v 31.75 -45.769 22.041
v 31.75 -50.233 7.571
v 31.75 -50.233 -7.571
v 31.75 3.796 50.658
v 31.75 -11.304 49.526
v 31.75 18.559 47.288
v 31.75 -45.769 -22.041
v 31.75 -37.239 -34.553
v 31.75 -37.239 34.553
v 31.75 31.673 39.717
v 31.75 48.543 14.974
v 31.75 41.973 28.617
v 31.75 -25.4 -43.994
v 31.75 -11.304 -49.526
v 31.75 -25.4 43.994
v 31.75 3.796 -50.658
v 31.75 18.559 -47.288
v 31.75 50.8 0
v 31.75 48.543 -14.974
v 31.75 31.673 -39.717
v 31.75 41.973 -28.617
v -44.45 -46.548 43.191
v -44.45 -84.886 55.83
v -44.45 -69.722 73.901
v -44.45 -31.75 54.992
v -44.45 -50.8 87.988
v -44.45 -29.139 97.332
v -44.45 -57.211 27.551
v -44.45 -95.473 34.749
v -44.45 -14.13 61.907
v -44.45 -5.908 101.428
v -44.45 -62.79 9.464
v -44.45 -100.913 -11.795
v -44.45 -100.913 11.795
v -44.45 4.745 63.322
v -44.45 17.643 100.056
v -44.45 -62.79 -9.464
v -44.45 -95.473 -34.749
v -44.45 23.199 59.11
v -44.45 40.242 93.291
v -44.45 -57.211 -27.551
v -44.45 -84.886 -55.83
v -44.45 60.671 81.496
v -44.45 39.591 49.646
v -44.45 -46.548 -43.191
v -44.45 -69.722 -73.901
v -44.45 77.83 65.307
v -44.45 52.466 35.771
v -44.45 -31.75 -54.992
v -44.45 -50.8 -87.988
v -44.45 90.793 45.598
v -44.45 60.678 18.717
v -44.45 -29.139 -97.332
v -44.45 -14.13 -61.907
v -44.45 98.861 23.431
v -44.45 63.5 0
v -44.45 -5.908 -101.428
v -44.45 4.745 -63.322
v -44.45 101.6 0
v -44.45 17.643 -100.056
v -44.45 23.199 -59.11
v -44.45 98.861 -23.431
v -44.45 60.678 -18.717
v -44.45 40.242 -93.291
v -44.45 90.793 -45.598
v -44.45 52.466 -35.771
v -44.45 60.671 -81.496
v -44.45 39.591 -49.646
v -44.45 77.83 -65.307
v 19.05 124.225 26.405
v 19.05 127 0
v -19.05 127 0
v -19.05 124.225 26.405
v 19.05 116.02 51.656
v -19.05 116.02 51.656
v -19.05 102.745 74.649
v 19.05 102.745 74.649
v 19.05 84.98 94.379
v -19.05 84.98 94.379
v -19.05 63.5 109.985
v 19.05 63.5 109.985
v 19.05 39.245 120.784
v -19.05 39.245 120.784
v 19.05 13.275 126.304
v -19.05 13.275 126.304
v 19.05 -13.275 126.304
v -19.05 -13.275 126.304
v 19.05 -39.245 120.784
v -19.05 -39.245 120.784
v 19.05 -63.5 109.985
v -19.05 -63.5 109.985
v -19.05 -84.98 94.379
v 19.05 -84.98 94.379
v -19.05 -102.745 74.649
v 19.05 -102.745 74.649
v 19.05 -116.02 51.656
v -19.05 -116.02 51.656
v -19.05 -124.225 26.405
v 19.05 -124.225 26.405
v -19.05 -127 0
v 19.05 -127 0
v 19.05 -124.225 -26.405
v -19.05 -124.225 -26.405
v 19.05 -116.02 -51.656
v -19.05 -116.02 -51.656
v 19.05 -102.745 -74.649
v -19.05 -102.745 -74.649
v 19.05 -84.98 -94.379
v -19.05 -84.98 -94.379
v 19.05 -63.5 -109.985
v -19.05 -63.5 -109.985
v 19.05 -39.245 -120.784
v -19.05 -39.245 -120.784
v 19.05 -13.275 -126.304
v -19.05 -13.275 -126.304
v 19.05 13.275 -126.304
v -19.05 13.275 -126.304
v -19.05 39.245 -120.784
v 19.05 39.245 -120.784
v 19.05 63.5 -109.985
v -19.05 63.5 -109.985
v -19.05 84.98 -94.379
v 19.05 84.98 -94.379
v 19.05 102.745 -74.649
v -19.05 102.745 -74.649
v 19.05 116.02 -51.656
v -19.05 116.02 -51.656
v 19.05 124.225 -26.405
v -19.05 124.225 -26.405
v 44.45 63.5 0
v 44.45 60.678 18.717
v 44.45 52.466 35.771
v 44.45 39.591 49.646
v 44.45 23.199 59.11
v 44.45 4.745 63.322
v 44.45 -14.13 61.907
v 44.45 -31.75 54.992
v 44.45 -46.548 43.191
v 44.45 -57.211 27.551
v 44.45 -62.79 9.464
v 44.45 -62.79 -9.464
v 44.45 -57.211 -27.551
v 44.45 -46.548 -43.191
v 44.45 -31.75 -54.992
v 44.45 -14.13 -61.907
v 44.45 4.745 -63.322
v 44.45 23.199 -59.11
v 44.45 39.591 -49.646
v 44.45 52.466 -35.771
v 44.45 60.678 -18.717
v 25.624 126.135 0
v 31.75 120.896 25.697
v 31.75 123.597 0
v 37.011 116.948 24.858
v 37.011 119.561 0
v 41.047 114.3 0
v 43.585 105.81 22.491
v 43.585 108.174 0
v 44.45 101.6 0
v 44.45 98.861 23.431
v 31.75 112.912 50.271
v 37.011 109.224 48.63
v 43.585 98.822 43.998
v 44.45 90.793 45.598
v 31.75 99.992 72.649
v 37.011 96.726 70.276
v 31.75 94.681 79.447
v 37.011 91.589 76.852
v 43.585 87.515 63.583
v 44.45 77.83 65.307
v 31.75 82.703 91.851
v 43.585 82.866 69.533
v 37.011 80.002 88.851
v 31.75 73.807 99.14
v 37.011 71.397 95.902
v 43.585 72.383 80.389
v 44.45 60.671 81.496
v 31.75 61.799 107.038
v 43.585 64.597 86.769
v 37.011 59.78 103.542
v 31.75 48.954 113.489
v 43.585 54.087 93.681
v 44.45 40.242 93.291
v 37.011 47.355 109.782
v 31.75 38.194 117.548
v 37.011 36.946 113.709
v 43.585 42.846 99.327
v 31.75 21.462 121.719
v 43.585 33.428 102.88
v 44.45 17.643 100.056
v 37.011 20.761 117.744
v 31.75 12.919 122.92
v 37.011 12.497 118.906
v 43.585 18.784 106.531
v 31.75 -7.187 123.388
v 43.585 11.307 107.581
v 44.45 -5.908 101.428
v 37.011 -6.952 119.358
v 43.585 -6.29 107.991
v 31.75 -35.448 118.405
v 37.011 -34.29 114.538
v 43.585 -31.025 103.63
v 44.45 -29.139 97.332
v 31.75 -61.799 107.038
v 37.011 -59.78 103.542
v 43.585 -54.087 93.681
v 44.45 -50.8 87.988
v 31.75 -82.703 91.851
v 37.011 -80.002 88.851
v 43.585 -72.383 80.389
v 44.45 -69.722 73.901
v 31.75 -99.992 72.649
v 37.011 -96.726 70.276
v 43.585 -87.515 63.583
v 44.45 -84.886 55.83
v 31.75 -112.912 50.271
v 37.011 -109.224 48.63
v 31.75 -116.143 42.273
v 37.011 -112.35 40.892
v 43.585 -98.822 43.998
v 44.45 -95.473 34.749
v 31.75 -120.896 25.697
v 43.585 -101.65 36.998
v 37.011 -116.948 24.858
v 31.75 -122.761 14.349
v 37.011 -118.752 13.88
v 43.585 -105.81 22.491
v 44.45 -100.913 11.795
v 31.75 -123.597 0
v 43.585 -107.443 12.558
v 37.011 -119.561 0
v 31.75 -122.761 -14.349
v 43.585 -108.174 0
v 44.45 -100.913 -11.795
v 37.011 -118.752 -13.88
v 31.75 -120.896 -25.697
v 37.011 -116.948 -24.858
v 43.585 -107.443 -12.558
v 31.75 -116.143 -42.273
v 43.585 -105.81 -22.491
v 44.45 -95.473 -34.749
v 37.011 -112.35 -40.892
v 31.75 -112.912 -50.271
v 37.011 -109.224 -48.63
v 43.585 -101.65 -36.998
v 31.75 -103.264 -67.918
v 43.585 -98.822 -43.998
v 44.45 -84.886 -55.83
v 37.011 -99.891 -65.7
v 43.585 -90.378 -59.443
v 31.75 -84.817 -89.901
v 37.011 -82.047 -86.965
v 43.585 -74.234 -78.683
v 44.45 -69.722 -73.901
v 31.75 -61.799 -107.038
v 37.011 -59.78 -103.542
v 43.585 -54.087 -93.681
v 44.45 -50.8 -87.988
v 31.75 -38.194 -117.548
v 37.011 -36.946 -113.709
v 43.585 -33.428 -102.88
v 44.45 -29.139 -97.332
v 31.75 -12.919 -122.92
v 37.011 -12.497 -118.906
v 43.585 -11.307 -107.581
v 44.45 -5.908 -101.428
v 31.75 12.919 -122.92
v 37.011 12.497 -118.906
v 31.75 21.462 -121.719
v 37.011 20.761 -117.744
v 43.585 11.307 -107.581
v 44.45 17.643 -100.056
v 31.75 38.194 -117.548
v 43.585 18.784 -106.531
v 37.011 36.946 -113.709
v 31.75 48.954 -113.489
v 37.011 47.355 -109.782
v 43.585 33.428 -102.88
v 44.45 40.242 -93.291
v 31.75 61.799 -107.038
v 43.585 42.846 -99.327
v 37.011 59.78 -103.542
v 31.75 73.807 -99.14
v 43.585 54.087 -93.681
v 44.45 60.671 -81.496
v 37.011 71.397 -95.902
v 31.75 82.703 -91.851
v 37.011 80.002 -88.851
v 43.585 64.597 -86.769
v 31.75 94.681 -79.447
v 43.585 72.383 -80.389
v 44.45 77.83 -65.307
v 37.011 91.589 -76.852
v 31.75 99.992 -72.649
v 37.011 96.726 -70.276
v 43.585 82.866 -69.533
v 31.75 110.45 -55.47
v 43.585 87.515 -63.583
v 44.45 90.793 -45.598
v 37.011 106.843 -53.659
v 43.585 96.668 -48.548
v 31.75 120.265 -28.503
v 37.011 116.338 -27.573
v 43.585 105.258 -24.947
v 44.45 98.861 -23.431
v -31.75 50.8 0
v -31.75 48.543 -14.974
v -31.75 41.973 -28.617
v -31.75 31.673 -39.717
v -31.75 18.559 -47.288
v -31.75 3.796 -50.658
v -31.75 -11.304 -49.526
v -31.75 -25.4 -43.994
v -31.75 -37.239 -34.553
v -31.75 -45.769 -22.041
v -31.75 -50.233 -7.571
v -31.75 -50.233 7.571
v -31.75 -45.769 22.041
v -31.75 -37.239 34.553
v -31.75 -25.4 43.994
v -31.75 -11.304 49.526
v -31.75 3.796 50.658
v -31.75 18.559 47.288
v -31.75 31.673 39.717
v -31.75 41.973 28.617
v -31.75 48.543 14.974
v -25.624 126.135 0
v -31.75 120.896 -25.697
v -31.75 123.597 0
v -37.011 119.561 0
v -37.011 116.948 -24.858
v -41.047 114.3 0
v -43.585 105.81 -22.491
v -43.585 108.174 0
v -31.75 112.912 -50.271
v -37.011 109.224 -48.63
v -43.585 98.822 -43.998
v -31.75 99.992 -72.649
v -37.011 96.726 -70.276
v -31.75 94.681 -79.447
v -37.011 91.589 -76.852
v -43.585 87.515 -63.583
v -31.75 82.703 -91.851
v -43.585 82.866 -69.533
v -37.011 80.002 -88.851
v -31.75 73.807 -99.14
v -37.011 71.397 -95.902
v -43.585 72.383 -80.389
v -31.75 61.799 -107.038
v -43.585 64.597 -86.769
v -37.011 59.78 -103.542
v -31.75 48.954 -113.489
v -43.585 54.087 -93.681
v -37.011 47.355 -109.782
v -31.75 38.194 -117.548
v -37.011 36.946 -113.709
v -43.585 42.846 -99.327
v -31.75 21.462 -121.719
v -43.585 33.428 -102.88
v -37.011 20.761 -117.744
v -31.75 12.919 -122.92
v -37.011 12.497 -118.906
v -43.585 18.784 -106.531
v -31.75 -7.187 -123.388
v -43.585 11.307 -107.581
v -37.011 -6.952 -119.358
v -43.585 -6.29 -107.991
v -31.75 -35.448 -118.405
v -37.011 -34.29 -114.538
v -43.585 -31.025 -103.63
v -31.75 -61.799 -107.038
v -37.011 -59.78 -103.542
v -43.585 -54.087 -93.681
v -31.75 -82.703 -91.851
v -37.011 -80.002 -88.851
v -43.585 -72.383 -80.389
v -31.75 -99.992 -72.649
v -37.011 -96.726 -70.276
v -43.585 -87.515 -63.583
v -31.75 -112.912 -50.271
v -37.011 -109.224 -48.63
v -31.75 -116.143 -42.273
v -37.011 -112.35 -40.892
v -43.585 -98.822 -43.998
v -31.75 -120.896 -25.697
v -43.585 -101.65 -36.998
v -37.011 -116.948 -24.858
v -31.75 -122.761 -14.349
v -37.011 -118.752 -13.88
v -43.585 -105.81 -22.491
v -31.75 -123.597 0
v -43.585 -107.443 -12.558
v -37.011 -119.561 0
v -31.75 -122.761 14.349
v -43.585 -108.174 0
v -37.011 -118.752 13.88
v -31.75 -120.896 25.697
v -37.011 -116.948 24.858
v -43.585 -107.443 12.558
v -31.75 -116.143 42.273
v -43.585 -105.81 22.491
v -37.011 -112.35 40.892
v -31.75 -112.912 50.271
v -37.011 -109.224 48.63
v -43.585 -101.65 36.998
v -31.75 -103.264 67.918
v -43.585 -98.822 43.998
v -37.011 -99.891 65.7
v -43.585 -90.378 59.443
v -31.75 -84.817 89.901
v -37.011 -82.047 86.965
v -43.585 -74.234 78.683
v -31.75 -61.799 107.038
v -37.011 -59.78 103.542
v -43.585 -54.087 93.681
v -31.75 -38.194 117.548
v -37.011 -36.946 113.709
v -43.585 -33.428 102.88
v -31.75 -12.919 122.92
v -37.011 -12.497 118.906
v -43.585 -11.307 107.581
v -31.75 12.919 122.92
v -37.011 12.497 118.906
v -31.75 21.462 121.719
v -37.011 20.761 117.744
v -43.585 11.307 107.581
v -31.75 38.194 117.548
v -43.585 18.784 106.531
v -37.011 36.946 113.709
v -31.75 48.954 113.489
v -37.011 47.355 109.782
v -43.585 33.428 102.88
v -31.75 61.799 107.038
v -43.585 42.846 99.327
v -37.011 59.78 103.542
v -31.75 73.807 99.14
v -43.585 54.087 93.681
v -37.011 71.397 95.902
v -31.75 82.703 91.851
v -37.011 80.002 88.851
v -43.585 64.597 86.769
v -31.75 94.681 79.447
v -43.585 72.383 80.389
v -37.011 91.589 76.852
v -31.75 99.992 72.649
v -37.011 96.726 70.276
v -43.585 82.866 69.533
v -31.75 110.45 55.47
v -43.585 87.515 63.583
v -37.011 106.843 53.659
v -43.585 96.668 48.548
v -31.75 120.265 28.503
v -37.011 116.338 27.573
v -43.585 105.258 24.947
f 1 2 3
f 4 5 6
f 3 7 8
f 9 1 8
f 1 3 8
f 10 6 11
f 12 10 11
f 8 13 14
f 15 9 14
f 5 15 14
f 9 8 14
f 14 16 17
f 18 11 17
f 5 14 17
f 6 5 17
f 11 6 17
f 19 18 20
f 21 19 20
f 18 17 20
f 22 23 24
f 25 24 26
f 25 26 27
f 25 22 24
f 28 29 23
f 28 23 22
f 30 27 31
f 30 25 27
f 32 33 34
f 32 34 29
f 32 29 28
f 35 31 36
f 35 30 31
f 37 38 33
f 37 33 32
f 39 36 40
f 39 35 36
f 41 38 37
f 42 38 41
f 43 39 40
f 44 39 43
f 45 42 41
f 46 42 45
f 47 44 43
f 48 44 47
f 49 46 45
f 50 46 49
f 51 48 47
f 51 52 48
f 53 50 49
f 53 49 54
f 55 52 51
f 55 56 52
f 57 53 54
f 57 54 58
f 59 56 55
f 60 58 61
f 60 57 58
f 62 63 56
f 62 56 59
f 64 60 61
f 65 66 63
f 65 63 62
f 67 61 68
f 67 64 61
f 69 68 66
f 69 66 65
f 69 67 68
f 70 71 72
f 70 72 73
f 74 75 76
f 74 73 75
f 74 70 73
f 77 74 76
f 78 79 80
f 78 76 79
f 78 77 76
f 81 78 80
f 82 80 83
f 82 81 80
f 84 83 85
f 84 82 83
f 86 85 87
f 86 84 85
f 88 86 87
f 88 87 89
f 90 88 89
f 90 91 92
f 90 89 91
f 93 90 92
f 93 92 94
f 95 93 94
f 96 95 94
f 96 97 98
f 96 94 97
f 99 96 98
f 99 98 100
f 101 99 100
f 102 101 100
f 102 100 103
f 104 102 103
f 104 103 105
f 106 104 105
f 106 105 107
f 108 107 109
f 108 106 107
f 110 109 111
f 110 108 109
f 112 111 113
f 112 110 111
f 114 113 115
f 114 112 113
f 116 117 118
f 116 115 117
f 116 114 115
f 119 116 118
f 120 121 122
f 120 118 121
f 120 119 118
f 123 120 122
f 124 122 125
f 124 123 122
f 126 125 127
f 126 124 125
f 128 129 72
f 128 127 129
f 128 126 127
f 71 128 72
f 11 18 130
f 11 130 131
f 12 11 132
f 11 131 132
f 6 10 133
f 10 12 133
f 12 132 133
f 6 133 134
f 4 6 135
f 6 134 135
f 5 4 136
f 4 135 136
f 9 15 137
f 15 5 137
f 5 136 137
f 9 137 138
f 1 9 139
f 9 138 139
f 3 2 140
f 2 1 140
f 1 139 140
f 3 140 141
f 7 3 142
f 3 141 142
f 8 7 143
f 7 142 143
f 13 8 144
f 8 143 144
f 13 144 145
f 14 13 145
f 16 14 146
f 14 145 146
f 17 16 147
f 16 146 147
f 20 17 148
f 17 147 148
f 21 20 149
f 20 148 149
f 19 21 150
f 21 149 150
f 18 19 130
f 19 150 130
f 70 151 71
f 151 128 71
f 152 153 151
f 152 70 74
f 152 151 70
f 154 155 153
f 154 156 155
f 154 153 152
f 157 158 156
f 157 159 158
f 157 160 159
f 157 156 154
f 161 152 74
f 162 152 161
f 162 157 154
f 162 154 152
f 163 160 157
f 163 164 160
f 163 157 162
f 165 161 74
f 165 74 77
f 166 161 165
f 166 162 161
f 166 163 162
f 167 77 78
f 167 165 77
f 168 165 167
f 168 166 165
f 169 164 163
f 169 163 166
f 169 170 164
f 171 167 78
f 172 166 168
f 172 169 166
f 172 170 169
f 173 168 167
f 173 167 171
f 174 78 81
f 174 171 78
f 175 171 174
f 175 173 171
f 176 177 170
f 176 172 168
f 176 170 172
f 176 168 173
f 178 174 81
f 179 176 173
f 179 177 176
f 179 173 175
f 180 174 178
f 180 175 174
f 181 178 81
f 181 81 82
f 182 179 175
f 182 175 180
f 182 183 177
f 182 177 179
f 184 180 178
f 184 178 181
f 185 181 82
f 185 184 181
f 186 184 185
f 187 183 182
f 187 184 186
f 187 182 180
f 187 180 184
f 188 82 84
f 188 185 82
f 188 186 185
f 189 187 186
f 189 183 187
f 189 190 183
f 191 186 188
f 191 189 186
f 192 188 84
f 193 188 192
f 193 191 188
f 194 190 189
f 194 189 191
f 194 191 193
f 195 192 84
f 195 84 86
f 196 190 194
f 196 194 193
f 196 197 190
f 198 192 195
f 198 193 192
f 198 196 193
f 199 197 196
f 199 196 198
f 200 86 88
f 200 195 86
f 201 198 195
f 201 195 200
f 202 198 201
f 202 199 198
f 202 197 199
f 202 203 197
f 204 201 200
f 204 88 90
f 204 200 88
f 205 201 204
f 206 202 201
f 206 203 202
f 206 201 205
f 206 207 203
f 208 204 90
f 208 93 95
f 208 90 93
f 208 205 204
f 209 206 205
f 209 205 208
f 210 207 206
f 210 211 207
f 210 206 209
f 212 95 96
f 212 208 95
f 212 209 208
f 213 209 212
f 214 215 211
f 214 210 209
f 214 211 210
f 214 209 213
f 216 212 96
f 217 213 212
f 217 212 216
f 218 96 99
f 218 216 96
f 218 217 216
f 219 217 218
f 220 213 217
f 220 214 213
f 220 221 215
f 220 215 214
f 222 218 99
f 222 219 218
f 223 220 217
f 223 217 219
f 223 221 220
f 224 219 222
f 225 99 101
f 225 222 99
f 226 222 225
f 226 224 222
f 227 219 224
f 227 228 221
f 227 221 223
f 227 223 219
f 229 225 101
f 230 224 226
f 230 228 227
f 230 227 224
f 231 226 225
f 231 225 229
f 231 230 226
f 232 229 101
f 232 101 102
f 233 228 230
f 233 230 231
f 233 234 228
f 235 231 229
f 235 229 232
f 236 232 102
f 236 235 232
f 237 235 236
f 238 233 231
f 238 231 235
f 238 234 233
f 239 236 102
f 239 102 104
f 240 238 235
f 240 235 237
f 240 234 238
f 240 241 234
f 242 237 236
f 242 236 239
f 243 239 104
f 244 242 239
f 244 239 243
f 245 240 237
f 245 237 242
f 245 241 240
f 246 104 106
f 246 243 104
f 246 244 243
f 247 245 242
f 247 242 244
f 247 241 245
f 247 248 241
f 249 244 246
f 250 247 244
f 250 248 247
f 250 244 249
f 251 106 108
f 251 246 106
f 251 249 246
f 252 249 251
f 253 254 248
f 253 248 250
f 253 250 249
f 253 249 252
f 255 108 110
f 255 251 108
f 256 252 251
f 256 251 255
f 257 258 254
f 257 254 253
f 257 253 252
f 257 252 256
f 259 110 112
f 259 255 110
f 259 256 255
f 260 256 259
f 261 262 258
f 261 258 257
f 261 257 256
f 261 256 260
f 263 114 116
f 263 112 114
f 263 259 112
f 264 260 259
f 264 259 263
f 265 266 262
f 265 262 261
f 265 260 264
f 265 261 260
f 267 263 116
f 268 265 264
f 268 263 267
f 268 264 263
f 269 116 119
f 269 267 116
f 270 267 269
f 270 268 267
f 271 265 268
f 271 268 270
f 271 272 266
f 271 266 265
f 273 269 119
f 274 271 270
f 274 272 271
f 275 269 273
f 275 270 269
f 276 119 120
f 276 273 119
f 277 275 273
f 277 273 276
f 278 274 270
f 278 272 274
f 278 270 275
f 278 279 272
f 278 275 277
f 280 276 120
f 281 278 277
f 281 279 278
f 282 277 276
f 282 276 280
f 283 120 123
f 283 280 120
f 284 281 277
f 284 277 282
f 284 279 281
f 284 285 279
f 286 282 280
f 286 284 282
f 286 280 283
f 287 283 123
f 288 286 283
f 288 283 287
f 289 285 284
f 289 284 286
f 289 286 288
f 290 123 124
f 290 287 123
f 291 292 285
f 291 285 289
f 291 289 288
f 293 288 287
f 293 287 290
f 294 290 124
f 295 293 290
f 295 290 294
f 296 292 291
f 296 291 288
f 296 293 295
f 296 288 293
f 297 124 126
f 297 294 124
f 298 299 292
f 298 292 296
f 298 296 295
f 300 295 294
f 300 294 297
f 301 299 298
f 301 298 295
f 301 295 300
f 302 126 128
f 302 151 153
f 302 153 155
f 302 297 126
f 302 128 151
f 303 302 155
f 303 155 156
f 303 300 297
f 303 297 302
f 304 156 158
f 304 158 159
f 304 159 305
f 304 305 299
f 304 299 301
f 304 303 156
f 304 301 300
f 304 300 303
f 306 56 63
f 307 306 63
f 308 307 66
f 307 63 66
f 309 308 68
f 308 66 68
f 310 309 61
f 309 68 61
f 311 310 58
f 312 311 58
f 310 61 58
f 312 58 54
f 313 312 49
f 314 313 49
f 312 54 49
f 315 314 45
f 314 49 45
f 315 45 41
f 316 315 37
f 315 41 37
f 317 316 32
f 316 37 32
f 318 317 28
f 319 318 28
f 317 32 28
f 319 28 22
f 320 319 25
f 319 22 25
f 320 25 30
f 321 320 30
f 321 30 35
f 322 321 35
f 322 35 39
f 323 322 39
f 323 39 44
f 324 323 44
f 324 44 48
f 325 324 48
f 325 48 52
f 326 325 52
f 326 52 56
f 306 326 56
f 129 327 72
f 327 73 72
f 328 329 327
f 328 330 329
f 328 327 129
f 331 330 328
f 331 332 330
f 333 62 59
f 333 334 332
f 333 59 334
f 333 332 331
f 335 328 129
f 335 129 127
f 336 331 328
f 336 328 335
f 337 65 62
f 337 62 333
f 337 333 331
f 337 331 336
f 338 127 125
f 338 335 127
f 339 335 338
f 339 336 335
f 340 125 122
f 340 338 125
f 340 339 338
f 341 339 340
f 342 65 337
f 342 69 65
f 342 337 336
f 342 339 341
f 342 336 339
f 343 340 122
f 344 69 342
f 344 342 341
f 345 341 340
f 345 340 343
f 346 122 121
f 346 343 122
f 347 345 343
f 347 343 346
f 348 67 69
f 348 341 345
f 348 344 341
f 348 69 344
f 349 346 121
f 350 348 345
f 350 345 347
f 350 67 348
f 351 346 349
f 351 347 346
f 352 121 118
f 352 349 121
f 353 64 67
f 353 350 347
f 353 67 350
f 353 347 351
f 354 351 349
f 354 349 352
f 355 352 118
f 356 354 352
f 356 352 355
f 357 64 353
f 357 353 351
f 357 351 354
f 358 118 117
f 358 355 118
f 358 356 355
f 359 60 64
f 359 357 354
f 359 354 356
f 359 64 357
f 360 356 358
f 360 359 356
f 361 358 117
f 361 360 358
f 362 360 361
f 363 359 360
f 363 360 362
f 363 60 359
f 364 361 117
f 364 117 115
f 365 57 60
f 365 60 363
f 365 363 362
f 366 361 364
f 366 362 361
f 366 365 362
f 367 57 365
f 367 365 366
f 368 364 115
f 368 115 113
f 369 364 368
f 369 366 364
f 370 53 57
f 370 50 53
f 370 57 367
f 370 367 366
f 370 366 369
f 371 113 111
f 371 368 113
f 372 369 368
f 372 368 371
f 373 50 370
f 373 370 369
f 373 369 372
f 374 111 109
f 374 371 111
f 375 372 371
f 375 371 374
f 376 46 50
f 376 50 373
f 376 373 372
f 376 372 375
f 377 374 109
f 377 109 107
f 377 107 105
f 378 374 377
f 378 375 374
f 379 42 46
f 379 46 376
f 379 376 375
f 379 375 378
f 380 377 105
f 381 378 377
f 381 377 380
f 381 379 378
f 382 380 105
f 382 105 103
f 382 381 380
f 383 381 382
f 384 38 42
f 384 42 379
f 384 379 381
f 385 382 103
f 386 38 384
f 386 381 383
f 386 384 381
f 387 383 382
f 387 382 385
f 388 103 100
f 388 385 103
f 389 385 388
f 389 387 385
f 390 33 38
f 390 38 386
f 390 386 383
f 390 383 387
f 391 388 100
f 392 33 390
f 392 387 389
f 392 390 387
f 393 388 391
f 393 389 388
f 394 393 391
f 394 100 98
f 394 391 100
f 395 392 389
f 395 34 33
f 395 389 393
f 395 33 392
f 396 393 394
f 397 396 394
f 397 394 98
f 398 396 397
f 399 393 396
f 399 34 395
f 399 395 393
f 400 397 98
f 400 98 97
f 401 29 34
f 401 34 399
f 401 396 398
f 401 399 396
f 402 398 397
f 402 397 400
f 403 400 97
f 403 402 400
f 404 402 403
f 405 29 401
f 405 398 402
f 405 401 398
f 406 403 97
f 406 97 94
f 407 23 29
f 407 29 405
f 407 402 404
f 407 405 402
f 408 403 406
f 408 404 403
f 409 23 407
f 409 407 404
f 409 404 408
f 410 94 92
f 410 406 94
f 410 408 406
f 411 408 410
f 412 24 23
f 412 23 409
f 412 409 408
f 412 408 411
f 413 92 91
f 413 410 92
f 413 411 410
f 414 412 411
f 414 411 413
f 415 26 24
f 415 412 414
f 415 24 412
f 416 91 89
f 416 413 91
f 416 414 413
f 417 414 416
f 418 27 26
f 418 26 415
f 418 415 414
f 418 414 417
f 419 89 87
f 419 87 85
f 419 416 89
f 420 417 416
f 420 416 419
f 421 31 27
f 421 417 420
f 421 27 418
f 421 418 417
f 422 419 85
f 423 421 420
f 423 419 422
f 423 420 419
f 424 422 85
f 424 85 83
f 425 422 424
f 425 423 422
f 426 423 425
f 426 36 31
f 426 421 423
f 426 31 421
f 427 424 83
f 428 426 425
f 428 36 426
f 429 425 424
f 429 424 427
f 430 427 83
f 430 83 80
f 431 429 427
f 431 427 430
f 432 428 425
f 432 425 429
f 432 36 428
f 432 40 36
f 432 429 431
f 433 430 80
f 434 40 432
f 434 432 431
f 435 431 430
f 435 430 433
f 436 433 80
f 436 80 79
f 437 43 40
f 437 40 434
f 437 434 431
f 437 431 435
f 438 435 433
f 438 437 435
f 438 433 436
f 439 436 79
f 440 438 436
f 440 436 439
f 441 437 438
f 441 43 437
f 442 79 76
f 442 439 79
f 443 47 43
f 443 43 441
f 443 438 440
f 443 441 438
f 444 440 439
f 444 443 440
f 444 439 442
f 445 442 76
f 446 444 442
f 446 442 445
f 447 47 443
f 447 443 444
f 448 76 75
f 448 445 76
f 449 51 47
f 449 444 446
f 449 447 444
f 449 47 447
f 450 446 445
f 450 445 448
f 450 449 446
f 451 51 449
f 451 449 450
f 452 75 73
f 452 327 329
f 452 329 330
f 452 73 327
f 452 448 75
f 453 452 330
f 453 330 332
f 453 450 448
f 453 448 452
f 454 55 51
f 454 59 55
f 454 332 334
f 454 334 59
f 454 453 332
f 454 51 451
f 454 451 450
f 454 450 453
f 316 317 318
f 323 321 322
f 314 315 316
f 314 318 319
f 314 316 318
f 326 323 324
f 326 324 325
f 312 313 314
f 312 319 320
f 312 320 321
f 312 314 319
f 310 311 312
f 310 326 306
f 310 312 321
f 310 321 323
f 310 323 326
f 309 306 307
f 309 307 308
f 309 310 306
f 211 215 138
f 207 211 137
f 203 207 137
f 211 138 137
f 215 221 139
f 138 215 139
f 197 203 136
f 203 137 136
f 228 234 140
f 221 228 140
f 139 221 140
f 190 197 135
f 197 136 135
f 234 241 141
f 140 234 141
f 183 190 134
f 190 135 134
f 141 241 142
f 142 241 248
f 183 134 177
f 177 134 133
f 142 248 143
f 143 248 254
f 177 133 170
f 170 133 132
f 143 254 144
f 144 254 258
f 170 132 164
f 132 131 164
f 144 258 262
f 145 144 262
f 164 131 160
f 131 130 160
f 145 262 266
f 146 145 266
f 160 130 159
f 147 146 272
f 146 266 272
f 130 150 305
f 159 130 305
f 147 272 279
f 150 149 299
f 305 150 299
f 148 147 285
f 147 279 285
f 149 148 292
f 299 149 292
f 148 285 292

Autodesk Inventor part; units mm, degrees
ref_plane "YZ Plane" through (0, 0, 0) normal (1, 0, 0) x (0, 1, 0)
ref_plane "XZ Plane" through (0, 0, 0) normal (0, 1, 0) x (-1, 0, 0)
ref_plane "XY Plane" through (0, 0, 0) normal (0, 0, 1) x (1, 0, 0)
sketch "Sketch1" plane through (0, 0, 0) normal (0, 0, 1) x (1, 0, 0)
  line L0 (-44.45, 127) -> (44.45, 127)
  line L1 (44.45, 127) -> (44.45, 50.8)
  line L2 (-44.45, 50.8) -> (-44.45, 127)
  line L3 (31.75, 50.8) -> (31.75, 0)
  line L4 (31.75, 0) -> (-31.75, 0)
  line L5 (-31.75, 0) -> (-31.75, 50.8)
  line L6 (-44.45, 50.8) -> (-31.75, 50.8)
  line L7 (31.75, 50.8) -> (44.45, 50.8)
  line L8 (152.4, 0) -> (-152.4, 0) construction
  point P0 (0, 0)
  dimension "d0" = 88.9
  dimension "d1" = 76.2
  dimension "d3" = 44.45
  dimension "d4" = 63.5
  dimension "d12" = 152.4
  dimension "d13" = 152.4
revolve "Snow Blower Tire" add sketch "Sketch1" angle 360 about axis through (31.75, 0, 0) along (-1, 0, 0)
fillet "Fillet1" radius 25.4 2 edges at (44.45, -127, 0) (-44.45, -127, 0)
chamfer "Chamfer1" distance 12.7 angle 45 2 edges at (44.45, -50.8, 0) (-44.45, -50.8, 0)
sketch "Sketch21" plane through (0, 0, 0) normal (0, 1, 0) x (-1, 0, 0)
  line L0 (83.9649, 0) -> (-81.8871, 0)
  point P0 (0, 0)
properties part number "Snow Blower Tire"
